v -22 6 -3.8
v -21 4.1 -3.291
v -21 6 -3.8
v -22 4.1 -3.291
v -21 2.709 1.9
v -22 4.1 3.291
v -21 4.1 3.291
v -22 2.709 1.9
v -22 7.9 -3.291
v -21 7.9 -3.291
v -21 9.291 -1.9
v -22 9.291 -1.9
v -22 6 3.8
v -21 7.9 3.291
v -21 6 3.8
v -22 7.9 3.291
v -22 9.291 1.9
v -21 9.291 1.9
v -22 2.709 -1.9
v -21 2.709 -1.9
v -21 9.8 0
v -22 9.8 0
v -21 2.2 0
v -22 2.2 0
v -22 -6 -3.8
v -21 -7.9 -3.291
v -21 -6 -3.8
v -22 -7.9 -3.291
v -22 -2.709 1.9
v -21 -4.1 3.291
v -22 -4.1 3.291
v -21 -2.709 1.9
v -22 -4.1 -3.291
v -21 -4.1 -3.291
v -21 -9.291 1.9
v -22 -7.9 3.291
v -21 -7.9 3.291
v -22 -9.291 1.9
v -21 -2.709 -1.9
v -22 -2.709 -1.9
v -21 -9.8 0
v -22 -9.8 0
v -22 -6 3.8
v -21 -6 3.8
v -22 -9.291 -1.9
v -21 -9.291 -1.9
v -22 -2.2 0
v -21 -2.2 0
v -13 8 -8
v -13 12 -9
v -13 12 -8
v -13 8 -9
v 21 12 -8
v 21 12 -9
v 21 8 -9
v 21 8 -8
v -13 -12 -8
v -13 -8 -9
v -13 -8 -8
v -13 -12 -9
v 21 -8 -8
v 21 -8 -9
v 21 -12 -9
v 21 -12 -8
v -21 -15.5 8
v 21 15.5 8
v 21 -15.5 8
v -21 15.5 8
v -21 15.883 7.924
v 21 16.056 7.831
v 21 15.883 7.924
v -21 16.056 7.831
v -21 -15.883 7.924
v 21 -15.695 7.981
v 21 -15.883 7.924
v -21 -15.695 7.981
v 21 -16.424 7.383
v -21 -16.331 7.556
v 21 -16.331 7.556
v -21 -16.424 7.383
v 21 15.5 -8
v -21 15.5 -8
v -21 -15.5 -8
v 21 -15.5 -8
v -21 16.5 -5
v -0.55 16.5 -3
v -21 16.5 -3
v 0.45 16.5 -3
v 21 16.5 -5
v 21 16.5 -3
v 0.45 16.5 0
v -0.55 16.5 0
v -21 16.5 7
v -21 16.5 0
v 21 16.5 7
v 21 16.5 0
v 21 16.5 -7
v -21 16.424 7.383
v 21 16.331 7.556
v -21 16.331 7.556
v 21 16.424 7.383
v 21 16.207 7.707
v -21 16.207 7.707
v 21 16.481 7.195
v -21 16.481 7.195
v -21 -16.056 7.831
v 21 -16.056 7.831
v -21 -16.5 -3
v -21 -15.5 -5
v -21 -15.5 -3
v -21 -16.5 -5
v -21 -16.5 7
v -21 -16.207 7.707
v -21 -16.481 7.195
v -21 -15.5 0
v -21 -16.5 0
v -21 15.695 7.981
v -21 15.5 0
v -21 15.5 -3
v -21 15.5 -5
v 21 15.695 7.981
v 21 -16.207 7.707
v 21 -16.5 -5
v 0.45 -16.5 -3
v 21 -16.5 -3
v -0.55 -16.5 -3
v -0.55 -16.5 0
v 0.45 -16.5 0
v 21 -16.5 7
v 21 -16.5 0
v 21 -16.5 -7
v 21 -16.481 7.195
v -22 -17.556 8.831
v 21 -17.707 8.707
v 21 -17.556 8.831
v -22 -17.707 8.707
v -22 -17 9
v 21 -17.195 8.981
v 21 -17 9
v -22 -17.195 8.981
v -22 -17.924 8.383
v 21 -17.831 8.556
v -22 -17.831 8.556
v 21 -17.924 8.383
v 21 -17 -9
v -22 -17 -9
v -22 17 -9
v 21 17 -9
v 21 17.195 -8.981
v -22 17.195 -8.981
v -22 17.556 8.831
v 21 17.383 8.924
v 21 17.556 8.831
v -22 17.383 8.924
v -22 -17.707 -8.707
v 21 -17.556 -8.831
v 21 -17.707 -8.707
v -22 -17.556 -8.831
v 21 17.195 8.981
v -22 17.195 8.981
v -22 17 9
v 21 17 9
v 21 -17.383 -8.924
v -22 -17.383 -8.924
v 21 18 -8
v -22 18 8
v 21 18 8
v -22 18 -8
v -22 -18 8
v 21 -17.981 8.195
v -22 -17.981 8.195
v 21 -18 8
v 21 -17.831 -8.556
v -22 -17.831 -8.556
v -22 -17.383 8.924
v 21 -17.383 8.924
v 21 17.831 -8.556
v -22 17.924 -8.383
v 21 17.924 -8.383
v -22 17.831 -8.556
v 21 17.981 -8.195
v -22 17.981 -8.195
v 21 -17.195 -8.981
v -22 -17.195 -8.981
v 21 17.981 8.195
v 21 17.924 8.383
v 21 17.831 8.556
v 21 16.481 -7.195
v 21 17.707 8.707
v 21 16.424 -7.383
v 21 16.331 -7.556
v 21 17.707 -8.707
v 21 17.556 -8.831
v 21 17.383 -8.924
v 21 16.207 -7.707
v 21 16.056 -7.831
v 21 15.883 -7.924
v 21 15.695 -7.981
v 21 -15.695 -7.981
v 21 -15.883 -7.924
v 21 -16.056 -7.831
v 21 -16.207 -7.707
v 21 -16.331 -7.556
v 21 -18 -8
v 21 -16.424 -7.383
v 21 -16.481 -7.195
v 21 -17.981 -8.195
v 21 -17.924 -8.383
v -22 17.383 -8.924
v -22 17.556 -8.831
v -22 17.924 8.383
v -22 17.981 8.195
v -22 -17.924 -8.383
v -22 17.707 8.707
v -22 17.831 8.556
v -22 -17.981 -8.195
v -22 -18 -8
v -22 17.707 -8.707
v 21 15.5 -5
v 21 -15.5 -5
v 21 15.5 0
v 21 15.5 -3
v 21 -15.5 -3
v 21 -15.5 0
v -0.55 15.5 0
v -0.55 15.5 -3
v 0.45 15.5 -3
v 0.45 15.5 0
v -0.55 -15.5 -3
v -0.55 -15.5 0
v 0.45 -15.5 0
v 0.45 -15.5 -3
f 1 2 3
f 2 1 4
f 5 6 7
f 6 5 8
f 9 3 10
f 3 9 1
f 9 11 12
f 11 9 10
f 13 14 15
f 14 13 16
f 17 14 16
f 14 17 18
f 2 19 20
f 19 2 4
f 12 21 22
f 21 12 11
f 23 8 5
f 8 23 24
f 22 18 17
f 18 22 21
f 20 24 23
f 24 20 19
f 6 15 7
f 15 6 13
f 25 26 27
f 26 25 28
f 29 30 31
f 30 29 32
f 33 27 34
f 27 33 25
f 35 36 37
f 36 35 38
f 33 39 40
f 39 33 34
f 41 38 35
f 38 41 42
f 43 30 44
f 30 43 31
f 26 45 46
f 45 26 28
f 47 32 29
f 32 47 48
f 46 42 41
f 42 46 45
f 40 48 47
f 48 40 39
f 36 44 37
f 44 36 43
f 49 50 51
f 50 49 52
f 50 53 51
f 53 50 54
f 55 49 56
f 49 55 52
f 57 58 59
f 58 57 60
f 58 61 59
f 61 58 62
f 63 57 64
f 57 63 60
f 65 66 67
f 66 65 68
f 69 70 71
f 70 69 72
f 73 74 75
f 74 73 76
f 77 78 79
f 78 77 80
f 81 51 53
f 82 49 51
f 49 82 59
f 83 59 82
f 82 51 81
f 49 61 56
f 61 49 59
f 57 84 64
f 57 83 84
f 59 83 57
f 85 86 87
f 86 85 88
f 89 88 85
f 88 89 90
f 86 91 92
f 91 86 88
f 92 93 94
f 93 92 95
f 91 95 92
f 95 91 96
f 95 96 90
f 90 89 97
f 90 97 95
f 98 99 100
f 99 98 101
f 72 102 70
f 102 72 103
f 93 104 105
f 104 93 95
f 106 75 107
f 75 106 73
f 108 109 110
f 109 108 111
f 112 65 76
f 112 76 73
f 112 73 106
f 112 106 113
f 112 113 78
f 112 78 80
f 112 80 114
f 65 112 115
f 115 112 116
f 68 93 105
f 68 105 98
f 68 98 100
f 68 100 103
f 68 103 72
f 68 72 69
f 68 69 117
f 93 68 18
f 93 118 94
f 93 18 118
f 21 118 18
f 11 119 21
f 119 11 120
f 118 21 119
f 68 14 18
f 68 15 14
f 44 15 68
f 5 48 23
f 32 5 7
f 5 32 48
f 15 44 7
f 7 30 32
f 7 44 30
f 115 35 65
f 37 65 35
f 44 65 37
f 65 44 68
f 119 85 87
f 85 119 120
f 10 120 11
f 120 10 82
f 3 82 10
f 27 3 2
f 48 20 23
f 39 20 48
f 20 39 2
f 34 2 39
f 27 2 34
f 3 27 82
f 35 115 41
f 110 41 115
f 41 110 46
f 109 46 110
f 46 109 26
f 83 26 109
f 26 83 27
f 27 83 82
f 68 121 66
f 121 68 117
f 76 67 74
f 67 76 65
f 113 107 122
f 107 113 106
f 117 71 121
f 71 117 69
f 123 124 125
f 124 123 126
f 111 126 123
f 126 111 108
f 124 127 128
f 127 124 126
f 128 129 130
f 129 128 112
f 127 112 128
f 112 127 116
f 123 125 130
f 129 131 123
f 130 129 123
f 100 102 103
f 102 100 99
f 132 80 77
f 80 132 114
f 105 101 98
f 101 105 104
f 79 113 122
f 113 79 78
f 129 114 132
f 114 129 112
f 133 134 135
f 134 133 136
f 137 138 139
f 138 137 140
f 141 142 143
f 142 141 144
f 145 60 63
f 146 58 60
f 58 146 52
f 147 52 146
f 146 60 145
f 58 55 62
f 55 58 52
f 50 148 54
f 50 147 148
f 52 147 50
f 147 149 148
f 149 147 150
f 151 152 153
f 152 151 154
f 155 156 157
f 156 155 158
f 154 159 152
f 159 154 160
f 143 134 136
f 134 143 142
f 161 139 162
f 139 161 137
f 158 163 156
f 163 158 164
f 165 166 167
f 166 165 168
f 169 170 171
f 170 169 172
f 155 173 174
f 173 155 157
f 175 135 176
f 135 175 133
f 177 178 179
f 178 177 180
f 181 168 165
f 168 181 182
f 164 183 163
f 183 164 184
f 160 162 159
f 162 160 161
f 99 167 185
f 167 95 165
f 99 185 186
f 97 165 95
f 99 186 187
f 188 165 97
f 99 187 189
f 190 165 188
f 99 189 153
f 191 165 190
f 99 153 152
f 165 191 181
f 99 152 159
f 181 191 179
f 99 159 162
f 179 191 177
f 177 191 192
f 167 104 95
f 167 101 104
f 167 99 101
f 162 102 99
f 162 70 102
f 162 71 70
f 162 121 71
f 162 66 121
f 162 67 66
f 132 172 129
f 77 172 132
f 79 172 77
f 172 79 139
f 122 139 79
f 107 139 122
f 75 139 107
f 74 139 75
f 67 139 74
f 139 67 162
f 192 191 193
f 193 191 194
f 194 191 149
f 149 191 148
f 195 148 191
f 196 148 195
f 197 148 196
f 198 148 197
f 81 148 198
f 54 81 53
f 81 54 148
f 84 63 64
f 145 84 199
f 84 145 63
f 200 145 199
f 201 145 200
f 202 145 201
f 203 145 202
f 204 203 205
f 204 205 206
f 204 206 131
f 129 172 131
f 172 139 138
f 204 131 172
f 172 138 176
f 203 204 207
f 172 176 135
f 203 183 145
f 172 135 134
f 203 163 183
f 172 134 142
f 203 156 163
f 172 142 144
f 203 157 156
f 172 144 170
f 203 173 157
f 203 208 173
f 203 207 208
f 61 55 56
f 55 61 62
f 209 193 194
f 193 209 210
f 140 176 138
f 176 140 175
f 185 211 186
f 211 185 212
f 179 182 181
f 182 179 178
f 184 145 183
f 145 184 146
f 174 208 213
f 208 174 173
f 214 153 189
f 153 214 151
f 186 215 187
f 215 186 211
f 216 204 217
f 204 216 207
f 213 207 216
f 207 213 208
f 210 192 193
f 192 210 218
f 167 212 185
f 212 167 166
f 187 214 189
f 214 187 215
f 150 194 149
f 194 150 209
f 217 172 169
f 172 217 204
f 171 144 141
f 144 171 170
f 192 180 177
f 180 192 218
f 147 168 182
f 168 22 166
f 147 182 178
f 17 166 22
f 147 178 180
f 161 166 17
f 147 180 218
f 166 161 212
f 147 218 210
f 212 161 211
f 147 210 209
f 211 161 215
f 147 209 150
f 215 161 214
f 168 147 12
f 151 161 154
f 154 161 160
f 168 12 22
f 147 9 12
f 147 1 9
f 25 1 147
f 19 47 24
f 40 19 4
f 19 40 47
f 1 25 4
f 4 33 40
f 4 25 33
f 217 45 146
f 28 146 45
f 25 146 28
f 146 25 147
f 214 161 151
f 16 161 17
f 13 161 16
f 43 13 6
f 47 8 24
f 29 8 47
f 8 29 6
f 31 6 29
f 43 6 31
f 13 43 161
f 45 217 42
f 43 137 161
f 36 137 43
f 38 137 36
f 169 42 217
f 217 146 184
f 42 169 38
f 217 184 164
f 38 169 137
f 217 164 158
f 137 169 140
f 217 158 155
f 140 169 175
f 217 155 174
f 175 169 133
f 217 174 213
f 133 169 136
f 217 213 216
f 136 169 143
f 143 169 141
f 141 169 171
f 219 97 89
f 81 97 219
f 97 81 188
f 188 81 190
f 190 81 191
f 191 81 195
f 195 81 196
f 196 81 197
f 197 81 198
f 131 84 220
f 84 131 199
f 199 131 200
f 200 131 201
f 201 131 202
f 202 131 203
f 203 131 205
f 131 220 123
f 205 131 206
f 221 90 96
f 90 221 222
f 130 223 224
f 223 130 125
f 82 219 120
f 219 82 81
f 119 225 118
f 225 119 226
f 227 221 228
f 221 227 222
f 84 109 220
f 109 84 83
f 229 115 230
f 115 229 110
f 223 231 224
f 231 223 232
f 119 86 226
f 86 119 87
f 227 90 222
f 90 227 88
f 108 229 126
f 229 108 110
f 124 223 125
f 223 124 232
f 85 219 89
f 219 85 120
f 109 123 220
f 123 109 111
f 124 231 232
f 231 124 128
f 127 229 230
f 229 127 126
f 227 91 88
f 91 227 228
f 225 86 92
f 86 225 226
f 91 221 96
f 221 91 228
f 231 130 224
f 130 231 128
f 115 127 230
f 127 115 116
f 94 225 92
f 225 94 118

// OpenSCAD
use <../prim.scad>

board_x = 42;
board_y = 33;
board_z = 2;

arm_below_z = 2;
arm_lo_z = 2;
arm_up_z = 2;
arm_above_z = 8;
arm_left_t = 1;
arm_right_t = 1;
arm_front_t = 0;

stuff_x = board_x;
stuff_y = board_y;
stuff_z = board_z+arm_lo_z+arm_up_z+arm_below_z+arm_above_z;

holder_wall_t = 1;
holder_x = stuff_x + holder_wall_t;
holder_y = stuff_y + holder_wall_t*2;
holder_z = stuff_z + holder_wall_t*2;
holder_bottom_cutouts=[[8,10,4],[8,-10,4]];
holder_front_cutouts = [[6, 3.8], [-6, 3.8]];

audiojack_r = 3.8;

WELDING=0.1;

newcase1_main(target="default");

function front_center(sx, tx) = [-sx/2+tx/2, 0, 0];
function left_center(sy, ty)  = [0, -sy/2+ty/2, 0];
function right_center(sy, ty) = [0, sy/2-ty/2, 0];
function top_center(sz, tz) = [0, 0, sz/2-tz/2];
function bottom_center(sz, tz) = [0, 0, -sz/2+tz/2];

module caller_hook() {
    echo("this is caller_hook");}

// bbox: (x,y,z) = (same as board_x, same as board_y, board_z + space above*below it)
module newcase1_main(target="default"){

    newcase1_holder(holder_y=36, with_round=1);
    newcase1_arm(with_welding=1);
}

module newcase1_arm(with_welding=1, left_cut_outs=[], right_cutouts=[]) {
// x,y-center of model = center of board
    // z-center of model = center of board space (i.e. board thickness + space above and below board)
    dx = with_welding*WELDING;
    dy = with_welding*WELDING;
    dz = with_welding*WELDING;

    translate([-dx/2, 0, 0]) {
        difference() {
            cube([stuff_x+dx, stuff_y+dy, stuff_z+dz], center=true);
            union() {
                translate([arm_front_t, arm_left_t/2-arm_right_t/2, 0]) {
                    cube([board_x+WELDING, board_y-arm_left_t-arm_right_t, stuff_z*2], center=true);
                }
                translate([0, 0, -holder_z/2+arm_below_z+arm_lo_z+board_z/2]) {
                    #cube([board_x+WELDING, board_y+WELDING, board_z], center=true);
                }

                // left cut out
                translate(left_center(board_y, arm_left_t)) {
                    #cube([1, arm_left_t+WELDING,10], center=true);
                }

                // right cut out
                translate(right_center(board_y, arm_right_t)) {
                    #cube([1, arm_right_t+WELDING,10], center=true);
                }

                // top (above-arm) cut out
                translate(top_center(stuff_z, 0)) {
                    #cube([stuff_x+dx, stuff_y+dy, arm_above_z*2], center=true);
                }
                
            }
        }
    }
}

module newcase1_holder(holder_x=holder_x, holder_y=holder_y,
                       front_cutouts=holder_front_cutouts,
                       bottom_cutouts=holder_bottom_cutouts,
                       with_open_roof=0, with_open_bottom=0, with_round=0, with_round_innder=1) {
    
    translate([-holder_wall_t/2,0,0]) {
        difference() {
            union() {
                if (with_round) {
                    prim_round_xplate0(holder_x, holder_y, holder_z, 1, 32);
                } else {
                    cube([holder_x, holder_y, holder_z], center=true);
                }
            }
            union() {
                translate([+holder_wall_t/2+WELDING/2,0,0]) {
                    if (with_round_innder) {
                        prim_round_xplate0(stuff_x+WELDING, stuff_y, stuff_z, 1, 32);
                    } else {
                        cube([stuff_x+WELDING, stuff_y, stuff_z], center=true);
                    }
                }

                if (with_open_roof) {
                    // open roof
                    translate(top_center(holder_z, holder_wall_t)) {
                        cube([holder_x*2, holder_y*2, holder_wall_t+WELDING], center=true);
                    }
                }
                if (with_open_bottom) {
                    // open bottom
                    translate(bottom_center(holder_z, holder_wall_t)) {
                        #cube([holder_x*2, holder_y*2, holder_wall_t+WELDING], center=true);
                    }
                }

                // front cut outs
                translate(front_center(board_x, arm_front_t+WELDING)) {
                    for (cutout=front_cutouts){
                        cpos_x = cutout[0];
                        cwidth = cutout[1];
                        cr = cutout[1];
                        translate([0, cpos_x, 0]) {
                            //#cube([arm_front_t+WELDING+WELDING, cwidth, 10], center=true);
                            rotate([0,90,0]) {
                                #cylinder(r=audiojack_r, h=cr, fn=16, center=true);
                            }
                        }
                    }
                }
                
                // bottom cut out
                translate(bottom_center(holder_z, holder_wall_t)) {
                    for (cutout=bottom_cutouts) {
                        pos_x = cutout[0];
                        pos_y = cutout[1];
                        width = cutout[2];
                        translate([holder_wall_t+pos_x/2,pos_y,0]){
                            #cube([holder_x-pos_x, width, holder_wall_t+WELDING], center=true);
                        }
                    }
                }
                
                
            }
        }
    }

}
